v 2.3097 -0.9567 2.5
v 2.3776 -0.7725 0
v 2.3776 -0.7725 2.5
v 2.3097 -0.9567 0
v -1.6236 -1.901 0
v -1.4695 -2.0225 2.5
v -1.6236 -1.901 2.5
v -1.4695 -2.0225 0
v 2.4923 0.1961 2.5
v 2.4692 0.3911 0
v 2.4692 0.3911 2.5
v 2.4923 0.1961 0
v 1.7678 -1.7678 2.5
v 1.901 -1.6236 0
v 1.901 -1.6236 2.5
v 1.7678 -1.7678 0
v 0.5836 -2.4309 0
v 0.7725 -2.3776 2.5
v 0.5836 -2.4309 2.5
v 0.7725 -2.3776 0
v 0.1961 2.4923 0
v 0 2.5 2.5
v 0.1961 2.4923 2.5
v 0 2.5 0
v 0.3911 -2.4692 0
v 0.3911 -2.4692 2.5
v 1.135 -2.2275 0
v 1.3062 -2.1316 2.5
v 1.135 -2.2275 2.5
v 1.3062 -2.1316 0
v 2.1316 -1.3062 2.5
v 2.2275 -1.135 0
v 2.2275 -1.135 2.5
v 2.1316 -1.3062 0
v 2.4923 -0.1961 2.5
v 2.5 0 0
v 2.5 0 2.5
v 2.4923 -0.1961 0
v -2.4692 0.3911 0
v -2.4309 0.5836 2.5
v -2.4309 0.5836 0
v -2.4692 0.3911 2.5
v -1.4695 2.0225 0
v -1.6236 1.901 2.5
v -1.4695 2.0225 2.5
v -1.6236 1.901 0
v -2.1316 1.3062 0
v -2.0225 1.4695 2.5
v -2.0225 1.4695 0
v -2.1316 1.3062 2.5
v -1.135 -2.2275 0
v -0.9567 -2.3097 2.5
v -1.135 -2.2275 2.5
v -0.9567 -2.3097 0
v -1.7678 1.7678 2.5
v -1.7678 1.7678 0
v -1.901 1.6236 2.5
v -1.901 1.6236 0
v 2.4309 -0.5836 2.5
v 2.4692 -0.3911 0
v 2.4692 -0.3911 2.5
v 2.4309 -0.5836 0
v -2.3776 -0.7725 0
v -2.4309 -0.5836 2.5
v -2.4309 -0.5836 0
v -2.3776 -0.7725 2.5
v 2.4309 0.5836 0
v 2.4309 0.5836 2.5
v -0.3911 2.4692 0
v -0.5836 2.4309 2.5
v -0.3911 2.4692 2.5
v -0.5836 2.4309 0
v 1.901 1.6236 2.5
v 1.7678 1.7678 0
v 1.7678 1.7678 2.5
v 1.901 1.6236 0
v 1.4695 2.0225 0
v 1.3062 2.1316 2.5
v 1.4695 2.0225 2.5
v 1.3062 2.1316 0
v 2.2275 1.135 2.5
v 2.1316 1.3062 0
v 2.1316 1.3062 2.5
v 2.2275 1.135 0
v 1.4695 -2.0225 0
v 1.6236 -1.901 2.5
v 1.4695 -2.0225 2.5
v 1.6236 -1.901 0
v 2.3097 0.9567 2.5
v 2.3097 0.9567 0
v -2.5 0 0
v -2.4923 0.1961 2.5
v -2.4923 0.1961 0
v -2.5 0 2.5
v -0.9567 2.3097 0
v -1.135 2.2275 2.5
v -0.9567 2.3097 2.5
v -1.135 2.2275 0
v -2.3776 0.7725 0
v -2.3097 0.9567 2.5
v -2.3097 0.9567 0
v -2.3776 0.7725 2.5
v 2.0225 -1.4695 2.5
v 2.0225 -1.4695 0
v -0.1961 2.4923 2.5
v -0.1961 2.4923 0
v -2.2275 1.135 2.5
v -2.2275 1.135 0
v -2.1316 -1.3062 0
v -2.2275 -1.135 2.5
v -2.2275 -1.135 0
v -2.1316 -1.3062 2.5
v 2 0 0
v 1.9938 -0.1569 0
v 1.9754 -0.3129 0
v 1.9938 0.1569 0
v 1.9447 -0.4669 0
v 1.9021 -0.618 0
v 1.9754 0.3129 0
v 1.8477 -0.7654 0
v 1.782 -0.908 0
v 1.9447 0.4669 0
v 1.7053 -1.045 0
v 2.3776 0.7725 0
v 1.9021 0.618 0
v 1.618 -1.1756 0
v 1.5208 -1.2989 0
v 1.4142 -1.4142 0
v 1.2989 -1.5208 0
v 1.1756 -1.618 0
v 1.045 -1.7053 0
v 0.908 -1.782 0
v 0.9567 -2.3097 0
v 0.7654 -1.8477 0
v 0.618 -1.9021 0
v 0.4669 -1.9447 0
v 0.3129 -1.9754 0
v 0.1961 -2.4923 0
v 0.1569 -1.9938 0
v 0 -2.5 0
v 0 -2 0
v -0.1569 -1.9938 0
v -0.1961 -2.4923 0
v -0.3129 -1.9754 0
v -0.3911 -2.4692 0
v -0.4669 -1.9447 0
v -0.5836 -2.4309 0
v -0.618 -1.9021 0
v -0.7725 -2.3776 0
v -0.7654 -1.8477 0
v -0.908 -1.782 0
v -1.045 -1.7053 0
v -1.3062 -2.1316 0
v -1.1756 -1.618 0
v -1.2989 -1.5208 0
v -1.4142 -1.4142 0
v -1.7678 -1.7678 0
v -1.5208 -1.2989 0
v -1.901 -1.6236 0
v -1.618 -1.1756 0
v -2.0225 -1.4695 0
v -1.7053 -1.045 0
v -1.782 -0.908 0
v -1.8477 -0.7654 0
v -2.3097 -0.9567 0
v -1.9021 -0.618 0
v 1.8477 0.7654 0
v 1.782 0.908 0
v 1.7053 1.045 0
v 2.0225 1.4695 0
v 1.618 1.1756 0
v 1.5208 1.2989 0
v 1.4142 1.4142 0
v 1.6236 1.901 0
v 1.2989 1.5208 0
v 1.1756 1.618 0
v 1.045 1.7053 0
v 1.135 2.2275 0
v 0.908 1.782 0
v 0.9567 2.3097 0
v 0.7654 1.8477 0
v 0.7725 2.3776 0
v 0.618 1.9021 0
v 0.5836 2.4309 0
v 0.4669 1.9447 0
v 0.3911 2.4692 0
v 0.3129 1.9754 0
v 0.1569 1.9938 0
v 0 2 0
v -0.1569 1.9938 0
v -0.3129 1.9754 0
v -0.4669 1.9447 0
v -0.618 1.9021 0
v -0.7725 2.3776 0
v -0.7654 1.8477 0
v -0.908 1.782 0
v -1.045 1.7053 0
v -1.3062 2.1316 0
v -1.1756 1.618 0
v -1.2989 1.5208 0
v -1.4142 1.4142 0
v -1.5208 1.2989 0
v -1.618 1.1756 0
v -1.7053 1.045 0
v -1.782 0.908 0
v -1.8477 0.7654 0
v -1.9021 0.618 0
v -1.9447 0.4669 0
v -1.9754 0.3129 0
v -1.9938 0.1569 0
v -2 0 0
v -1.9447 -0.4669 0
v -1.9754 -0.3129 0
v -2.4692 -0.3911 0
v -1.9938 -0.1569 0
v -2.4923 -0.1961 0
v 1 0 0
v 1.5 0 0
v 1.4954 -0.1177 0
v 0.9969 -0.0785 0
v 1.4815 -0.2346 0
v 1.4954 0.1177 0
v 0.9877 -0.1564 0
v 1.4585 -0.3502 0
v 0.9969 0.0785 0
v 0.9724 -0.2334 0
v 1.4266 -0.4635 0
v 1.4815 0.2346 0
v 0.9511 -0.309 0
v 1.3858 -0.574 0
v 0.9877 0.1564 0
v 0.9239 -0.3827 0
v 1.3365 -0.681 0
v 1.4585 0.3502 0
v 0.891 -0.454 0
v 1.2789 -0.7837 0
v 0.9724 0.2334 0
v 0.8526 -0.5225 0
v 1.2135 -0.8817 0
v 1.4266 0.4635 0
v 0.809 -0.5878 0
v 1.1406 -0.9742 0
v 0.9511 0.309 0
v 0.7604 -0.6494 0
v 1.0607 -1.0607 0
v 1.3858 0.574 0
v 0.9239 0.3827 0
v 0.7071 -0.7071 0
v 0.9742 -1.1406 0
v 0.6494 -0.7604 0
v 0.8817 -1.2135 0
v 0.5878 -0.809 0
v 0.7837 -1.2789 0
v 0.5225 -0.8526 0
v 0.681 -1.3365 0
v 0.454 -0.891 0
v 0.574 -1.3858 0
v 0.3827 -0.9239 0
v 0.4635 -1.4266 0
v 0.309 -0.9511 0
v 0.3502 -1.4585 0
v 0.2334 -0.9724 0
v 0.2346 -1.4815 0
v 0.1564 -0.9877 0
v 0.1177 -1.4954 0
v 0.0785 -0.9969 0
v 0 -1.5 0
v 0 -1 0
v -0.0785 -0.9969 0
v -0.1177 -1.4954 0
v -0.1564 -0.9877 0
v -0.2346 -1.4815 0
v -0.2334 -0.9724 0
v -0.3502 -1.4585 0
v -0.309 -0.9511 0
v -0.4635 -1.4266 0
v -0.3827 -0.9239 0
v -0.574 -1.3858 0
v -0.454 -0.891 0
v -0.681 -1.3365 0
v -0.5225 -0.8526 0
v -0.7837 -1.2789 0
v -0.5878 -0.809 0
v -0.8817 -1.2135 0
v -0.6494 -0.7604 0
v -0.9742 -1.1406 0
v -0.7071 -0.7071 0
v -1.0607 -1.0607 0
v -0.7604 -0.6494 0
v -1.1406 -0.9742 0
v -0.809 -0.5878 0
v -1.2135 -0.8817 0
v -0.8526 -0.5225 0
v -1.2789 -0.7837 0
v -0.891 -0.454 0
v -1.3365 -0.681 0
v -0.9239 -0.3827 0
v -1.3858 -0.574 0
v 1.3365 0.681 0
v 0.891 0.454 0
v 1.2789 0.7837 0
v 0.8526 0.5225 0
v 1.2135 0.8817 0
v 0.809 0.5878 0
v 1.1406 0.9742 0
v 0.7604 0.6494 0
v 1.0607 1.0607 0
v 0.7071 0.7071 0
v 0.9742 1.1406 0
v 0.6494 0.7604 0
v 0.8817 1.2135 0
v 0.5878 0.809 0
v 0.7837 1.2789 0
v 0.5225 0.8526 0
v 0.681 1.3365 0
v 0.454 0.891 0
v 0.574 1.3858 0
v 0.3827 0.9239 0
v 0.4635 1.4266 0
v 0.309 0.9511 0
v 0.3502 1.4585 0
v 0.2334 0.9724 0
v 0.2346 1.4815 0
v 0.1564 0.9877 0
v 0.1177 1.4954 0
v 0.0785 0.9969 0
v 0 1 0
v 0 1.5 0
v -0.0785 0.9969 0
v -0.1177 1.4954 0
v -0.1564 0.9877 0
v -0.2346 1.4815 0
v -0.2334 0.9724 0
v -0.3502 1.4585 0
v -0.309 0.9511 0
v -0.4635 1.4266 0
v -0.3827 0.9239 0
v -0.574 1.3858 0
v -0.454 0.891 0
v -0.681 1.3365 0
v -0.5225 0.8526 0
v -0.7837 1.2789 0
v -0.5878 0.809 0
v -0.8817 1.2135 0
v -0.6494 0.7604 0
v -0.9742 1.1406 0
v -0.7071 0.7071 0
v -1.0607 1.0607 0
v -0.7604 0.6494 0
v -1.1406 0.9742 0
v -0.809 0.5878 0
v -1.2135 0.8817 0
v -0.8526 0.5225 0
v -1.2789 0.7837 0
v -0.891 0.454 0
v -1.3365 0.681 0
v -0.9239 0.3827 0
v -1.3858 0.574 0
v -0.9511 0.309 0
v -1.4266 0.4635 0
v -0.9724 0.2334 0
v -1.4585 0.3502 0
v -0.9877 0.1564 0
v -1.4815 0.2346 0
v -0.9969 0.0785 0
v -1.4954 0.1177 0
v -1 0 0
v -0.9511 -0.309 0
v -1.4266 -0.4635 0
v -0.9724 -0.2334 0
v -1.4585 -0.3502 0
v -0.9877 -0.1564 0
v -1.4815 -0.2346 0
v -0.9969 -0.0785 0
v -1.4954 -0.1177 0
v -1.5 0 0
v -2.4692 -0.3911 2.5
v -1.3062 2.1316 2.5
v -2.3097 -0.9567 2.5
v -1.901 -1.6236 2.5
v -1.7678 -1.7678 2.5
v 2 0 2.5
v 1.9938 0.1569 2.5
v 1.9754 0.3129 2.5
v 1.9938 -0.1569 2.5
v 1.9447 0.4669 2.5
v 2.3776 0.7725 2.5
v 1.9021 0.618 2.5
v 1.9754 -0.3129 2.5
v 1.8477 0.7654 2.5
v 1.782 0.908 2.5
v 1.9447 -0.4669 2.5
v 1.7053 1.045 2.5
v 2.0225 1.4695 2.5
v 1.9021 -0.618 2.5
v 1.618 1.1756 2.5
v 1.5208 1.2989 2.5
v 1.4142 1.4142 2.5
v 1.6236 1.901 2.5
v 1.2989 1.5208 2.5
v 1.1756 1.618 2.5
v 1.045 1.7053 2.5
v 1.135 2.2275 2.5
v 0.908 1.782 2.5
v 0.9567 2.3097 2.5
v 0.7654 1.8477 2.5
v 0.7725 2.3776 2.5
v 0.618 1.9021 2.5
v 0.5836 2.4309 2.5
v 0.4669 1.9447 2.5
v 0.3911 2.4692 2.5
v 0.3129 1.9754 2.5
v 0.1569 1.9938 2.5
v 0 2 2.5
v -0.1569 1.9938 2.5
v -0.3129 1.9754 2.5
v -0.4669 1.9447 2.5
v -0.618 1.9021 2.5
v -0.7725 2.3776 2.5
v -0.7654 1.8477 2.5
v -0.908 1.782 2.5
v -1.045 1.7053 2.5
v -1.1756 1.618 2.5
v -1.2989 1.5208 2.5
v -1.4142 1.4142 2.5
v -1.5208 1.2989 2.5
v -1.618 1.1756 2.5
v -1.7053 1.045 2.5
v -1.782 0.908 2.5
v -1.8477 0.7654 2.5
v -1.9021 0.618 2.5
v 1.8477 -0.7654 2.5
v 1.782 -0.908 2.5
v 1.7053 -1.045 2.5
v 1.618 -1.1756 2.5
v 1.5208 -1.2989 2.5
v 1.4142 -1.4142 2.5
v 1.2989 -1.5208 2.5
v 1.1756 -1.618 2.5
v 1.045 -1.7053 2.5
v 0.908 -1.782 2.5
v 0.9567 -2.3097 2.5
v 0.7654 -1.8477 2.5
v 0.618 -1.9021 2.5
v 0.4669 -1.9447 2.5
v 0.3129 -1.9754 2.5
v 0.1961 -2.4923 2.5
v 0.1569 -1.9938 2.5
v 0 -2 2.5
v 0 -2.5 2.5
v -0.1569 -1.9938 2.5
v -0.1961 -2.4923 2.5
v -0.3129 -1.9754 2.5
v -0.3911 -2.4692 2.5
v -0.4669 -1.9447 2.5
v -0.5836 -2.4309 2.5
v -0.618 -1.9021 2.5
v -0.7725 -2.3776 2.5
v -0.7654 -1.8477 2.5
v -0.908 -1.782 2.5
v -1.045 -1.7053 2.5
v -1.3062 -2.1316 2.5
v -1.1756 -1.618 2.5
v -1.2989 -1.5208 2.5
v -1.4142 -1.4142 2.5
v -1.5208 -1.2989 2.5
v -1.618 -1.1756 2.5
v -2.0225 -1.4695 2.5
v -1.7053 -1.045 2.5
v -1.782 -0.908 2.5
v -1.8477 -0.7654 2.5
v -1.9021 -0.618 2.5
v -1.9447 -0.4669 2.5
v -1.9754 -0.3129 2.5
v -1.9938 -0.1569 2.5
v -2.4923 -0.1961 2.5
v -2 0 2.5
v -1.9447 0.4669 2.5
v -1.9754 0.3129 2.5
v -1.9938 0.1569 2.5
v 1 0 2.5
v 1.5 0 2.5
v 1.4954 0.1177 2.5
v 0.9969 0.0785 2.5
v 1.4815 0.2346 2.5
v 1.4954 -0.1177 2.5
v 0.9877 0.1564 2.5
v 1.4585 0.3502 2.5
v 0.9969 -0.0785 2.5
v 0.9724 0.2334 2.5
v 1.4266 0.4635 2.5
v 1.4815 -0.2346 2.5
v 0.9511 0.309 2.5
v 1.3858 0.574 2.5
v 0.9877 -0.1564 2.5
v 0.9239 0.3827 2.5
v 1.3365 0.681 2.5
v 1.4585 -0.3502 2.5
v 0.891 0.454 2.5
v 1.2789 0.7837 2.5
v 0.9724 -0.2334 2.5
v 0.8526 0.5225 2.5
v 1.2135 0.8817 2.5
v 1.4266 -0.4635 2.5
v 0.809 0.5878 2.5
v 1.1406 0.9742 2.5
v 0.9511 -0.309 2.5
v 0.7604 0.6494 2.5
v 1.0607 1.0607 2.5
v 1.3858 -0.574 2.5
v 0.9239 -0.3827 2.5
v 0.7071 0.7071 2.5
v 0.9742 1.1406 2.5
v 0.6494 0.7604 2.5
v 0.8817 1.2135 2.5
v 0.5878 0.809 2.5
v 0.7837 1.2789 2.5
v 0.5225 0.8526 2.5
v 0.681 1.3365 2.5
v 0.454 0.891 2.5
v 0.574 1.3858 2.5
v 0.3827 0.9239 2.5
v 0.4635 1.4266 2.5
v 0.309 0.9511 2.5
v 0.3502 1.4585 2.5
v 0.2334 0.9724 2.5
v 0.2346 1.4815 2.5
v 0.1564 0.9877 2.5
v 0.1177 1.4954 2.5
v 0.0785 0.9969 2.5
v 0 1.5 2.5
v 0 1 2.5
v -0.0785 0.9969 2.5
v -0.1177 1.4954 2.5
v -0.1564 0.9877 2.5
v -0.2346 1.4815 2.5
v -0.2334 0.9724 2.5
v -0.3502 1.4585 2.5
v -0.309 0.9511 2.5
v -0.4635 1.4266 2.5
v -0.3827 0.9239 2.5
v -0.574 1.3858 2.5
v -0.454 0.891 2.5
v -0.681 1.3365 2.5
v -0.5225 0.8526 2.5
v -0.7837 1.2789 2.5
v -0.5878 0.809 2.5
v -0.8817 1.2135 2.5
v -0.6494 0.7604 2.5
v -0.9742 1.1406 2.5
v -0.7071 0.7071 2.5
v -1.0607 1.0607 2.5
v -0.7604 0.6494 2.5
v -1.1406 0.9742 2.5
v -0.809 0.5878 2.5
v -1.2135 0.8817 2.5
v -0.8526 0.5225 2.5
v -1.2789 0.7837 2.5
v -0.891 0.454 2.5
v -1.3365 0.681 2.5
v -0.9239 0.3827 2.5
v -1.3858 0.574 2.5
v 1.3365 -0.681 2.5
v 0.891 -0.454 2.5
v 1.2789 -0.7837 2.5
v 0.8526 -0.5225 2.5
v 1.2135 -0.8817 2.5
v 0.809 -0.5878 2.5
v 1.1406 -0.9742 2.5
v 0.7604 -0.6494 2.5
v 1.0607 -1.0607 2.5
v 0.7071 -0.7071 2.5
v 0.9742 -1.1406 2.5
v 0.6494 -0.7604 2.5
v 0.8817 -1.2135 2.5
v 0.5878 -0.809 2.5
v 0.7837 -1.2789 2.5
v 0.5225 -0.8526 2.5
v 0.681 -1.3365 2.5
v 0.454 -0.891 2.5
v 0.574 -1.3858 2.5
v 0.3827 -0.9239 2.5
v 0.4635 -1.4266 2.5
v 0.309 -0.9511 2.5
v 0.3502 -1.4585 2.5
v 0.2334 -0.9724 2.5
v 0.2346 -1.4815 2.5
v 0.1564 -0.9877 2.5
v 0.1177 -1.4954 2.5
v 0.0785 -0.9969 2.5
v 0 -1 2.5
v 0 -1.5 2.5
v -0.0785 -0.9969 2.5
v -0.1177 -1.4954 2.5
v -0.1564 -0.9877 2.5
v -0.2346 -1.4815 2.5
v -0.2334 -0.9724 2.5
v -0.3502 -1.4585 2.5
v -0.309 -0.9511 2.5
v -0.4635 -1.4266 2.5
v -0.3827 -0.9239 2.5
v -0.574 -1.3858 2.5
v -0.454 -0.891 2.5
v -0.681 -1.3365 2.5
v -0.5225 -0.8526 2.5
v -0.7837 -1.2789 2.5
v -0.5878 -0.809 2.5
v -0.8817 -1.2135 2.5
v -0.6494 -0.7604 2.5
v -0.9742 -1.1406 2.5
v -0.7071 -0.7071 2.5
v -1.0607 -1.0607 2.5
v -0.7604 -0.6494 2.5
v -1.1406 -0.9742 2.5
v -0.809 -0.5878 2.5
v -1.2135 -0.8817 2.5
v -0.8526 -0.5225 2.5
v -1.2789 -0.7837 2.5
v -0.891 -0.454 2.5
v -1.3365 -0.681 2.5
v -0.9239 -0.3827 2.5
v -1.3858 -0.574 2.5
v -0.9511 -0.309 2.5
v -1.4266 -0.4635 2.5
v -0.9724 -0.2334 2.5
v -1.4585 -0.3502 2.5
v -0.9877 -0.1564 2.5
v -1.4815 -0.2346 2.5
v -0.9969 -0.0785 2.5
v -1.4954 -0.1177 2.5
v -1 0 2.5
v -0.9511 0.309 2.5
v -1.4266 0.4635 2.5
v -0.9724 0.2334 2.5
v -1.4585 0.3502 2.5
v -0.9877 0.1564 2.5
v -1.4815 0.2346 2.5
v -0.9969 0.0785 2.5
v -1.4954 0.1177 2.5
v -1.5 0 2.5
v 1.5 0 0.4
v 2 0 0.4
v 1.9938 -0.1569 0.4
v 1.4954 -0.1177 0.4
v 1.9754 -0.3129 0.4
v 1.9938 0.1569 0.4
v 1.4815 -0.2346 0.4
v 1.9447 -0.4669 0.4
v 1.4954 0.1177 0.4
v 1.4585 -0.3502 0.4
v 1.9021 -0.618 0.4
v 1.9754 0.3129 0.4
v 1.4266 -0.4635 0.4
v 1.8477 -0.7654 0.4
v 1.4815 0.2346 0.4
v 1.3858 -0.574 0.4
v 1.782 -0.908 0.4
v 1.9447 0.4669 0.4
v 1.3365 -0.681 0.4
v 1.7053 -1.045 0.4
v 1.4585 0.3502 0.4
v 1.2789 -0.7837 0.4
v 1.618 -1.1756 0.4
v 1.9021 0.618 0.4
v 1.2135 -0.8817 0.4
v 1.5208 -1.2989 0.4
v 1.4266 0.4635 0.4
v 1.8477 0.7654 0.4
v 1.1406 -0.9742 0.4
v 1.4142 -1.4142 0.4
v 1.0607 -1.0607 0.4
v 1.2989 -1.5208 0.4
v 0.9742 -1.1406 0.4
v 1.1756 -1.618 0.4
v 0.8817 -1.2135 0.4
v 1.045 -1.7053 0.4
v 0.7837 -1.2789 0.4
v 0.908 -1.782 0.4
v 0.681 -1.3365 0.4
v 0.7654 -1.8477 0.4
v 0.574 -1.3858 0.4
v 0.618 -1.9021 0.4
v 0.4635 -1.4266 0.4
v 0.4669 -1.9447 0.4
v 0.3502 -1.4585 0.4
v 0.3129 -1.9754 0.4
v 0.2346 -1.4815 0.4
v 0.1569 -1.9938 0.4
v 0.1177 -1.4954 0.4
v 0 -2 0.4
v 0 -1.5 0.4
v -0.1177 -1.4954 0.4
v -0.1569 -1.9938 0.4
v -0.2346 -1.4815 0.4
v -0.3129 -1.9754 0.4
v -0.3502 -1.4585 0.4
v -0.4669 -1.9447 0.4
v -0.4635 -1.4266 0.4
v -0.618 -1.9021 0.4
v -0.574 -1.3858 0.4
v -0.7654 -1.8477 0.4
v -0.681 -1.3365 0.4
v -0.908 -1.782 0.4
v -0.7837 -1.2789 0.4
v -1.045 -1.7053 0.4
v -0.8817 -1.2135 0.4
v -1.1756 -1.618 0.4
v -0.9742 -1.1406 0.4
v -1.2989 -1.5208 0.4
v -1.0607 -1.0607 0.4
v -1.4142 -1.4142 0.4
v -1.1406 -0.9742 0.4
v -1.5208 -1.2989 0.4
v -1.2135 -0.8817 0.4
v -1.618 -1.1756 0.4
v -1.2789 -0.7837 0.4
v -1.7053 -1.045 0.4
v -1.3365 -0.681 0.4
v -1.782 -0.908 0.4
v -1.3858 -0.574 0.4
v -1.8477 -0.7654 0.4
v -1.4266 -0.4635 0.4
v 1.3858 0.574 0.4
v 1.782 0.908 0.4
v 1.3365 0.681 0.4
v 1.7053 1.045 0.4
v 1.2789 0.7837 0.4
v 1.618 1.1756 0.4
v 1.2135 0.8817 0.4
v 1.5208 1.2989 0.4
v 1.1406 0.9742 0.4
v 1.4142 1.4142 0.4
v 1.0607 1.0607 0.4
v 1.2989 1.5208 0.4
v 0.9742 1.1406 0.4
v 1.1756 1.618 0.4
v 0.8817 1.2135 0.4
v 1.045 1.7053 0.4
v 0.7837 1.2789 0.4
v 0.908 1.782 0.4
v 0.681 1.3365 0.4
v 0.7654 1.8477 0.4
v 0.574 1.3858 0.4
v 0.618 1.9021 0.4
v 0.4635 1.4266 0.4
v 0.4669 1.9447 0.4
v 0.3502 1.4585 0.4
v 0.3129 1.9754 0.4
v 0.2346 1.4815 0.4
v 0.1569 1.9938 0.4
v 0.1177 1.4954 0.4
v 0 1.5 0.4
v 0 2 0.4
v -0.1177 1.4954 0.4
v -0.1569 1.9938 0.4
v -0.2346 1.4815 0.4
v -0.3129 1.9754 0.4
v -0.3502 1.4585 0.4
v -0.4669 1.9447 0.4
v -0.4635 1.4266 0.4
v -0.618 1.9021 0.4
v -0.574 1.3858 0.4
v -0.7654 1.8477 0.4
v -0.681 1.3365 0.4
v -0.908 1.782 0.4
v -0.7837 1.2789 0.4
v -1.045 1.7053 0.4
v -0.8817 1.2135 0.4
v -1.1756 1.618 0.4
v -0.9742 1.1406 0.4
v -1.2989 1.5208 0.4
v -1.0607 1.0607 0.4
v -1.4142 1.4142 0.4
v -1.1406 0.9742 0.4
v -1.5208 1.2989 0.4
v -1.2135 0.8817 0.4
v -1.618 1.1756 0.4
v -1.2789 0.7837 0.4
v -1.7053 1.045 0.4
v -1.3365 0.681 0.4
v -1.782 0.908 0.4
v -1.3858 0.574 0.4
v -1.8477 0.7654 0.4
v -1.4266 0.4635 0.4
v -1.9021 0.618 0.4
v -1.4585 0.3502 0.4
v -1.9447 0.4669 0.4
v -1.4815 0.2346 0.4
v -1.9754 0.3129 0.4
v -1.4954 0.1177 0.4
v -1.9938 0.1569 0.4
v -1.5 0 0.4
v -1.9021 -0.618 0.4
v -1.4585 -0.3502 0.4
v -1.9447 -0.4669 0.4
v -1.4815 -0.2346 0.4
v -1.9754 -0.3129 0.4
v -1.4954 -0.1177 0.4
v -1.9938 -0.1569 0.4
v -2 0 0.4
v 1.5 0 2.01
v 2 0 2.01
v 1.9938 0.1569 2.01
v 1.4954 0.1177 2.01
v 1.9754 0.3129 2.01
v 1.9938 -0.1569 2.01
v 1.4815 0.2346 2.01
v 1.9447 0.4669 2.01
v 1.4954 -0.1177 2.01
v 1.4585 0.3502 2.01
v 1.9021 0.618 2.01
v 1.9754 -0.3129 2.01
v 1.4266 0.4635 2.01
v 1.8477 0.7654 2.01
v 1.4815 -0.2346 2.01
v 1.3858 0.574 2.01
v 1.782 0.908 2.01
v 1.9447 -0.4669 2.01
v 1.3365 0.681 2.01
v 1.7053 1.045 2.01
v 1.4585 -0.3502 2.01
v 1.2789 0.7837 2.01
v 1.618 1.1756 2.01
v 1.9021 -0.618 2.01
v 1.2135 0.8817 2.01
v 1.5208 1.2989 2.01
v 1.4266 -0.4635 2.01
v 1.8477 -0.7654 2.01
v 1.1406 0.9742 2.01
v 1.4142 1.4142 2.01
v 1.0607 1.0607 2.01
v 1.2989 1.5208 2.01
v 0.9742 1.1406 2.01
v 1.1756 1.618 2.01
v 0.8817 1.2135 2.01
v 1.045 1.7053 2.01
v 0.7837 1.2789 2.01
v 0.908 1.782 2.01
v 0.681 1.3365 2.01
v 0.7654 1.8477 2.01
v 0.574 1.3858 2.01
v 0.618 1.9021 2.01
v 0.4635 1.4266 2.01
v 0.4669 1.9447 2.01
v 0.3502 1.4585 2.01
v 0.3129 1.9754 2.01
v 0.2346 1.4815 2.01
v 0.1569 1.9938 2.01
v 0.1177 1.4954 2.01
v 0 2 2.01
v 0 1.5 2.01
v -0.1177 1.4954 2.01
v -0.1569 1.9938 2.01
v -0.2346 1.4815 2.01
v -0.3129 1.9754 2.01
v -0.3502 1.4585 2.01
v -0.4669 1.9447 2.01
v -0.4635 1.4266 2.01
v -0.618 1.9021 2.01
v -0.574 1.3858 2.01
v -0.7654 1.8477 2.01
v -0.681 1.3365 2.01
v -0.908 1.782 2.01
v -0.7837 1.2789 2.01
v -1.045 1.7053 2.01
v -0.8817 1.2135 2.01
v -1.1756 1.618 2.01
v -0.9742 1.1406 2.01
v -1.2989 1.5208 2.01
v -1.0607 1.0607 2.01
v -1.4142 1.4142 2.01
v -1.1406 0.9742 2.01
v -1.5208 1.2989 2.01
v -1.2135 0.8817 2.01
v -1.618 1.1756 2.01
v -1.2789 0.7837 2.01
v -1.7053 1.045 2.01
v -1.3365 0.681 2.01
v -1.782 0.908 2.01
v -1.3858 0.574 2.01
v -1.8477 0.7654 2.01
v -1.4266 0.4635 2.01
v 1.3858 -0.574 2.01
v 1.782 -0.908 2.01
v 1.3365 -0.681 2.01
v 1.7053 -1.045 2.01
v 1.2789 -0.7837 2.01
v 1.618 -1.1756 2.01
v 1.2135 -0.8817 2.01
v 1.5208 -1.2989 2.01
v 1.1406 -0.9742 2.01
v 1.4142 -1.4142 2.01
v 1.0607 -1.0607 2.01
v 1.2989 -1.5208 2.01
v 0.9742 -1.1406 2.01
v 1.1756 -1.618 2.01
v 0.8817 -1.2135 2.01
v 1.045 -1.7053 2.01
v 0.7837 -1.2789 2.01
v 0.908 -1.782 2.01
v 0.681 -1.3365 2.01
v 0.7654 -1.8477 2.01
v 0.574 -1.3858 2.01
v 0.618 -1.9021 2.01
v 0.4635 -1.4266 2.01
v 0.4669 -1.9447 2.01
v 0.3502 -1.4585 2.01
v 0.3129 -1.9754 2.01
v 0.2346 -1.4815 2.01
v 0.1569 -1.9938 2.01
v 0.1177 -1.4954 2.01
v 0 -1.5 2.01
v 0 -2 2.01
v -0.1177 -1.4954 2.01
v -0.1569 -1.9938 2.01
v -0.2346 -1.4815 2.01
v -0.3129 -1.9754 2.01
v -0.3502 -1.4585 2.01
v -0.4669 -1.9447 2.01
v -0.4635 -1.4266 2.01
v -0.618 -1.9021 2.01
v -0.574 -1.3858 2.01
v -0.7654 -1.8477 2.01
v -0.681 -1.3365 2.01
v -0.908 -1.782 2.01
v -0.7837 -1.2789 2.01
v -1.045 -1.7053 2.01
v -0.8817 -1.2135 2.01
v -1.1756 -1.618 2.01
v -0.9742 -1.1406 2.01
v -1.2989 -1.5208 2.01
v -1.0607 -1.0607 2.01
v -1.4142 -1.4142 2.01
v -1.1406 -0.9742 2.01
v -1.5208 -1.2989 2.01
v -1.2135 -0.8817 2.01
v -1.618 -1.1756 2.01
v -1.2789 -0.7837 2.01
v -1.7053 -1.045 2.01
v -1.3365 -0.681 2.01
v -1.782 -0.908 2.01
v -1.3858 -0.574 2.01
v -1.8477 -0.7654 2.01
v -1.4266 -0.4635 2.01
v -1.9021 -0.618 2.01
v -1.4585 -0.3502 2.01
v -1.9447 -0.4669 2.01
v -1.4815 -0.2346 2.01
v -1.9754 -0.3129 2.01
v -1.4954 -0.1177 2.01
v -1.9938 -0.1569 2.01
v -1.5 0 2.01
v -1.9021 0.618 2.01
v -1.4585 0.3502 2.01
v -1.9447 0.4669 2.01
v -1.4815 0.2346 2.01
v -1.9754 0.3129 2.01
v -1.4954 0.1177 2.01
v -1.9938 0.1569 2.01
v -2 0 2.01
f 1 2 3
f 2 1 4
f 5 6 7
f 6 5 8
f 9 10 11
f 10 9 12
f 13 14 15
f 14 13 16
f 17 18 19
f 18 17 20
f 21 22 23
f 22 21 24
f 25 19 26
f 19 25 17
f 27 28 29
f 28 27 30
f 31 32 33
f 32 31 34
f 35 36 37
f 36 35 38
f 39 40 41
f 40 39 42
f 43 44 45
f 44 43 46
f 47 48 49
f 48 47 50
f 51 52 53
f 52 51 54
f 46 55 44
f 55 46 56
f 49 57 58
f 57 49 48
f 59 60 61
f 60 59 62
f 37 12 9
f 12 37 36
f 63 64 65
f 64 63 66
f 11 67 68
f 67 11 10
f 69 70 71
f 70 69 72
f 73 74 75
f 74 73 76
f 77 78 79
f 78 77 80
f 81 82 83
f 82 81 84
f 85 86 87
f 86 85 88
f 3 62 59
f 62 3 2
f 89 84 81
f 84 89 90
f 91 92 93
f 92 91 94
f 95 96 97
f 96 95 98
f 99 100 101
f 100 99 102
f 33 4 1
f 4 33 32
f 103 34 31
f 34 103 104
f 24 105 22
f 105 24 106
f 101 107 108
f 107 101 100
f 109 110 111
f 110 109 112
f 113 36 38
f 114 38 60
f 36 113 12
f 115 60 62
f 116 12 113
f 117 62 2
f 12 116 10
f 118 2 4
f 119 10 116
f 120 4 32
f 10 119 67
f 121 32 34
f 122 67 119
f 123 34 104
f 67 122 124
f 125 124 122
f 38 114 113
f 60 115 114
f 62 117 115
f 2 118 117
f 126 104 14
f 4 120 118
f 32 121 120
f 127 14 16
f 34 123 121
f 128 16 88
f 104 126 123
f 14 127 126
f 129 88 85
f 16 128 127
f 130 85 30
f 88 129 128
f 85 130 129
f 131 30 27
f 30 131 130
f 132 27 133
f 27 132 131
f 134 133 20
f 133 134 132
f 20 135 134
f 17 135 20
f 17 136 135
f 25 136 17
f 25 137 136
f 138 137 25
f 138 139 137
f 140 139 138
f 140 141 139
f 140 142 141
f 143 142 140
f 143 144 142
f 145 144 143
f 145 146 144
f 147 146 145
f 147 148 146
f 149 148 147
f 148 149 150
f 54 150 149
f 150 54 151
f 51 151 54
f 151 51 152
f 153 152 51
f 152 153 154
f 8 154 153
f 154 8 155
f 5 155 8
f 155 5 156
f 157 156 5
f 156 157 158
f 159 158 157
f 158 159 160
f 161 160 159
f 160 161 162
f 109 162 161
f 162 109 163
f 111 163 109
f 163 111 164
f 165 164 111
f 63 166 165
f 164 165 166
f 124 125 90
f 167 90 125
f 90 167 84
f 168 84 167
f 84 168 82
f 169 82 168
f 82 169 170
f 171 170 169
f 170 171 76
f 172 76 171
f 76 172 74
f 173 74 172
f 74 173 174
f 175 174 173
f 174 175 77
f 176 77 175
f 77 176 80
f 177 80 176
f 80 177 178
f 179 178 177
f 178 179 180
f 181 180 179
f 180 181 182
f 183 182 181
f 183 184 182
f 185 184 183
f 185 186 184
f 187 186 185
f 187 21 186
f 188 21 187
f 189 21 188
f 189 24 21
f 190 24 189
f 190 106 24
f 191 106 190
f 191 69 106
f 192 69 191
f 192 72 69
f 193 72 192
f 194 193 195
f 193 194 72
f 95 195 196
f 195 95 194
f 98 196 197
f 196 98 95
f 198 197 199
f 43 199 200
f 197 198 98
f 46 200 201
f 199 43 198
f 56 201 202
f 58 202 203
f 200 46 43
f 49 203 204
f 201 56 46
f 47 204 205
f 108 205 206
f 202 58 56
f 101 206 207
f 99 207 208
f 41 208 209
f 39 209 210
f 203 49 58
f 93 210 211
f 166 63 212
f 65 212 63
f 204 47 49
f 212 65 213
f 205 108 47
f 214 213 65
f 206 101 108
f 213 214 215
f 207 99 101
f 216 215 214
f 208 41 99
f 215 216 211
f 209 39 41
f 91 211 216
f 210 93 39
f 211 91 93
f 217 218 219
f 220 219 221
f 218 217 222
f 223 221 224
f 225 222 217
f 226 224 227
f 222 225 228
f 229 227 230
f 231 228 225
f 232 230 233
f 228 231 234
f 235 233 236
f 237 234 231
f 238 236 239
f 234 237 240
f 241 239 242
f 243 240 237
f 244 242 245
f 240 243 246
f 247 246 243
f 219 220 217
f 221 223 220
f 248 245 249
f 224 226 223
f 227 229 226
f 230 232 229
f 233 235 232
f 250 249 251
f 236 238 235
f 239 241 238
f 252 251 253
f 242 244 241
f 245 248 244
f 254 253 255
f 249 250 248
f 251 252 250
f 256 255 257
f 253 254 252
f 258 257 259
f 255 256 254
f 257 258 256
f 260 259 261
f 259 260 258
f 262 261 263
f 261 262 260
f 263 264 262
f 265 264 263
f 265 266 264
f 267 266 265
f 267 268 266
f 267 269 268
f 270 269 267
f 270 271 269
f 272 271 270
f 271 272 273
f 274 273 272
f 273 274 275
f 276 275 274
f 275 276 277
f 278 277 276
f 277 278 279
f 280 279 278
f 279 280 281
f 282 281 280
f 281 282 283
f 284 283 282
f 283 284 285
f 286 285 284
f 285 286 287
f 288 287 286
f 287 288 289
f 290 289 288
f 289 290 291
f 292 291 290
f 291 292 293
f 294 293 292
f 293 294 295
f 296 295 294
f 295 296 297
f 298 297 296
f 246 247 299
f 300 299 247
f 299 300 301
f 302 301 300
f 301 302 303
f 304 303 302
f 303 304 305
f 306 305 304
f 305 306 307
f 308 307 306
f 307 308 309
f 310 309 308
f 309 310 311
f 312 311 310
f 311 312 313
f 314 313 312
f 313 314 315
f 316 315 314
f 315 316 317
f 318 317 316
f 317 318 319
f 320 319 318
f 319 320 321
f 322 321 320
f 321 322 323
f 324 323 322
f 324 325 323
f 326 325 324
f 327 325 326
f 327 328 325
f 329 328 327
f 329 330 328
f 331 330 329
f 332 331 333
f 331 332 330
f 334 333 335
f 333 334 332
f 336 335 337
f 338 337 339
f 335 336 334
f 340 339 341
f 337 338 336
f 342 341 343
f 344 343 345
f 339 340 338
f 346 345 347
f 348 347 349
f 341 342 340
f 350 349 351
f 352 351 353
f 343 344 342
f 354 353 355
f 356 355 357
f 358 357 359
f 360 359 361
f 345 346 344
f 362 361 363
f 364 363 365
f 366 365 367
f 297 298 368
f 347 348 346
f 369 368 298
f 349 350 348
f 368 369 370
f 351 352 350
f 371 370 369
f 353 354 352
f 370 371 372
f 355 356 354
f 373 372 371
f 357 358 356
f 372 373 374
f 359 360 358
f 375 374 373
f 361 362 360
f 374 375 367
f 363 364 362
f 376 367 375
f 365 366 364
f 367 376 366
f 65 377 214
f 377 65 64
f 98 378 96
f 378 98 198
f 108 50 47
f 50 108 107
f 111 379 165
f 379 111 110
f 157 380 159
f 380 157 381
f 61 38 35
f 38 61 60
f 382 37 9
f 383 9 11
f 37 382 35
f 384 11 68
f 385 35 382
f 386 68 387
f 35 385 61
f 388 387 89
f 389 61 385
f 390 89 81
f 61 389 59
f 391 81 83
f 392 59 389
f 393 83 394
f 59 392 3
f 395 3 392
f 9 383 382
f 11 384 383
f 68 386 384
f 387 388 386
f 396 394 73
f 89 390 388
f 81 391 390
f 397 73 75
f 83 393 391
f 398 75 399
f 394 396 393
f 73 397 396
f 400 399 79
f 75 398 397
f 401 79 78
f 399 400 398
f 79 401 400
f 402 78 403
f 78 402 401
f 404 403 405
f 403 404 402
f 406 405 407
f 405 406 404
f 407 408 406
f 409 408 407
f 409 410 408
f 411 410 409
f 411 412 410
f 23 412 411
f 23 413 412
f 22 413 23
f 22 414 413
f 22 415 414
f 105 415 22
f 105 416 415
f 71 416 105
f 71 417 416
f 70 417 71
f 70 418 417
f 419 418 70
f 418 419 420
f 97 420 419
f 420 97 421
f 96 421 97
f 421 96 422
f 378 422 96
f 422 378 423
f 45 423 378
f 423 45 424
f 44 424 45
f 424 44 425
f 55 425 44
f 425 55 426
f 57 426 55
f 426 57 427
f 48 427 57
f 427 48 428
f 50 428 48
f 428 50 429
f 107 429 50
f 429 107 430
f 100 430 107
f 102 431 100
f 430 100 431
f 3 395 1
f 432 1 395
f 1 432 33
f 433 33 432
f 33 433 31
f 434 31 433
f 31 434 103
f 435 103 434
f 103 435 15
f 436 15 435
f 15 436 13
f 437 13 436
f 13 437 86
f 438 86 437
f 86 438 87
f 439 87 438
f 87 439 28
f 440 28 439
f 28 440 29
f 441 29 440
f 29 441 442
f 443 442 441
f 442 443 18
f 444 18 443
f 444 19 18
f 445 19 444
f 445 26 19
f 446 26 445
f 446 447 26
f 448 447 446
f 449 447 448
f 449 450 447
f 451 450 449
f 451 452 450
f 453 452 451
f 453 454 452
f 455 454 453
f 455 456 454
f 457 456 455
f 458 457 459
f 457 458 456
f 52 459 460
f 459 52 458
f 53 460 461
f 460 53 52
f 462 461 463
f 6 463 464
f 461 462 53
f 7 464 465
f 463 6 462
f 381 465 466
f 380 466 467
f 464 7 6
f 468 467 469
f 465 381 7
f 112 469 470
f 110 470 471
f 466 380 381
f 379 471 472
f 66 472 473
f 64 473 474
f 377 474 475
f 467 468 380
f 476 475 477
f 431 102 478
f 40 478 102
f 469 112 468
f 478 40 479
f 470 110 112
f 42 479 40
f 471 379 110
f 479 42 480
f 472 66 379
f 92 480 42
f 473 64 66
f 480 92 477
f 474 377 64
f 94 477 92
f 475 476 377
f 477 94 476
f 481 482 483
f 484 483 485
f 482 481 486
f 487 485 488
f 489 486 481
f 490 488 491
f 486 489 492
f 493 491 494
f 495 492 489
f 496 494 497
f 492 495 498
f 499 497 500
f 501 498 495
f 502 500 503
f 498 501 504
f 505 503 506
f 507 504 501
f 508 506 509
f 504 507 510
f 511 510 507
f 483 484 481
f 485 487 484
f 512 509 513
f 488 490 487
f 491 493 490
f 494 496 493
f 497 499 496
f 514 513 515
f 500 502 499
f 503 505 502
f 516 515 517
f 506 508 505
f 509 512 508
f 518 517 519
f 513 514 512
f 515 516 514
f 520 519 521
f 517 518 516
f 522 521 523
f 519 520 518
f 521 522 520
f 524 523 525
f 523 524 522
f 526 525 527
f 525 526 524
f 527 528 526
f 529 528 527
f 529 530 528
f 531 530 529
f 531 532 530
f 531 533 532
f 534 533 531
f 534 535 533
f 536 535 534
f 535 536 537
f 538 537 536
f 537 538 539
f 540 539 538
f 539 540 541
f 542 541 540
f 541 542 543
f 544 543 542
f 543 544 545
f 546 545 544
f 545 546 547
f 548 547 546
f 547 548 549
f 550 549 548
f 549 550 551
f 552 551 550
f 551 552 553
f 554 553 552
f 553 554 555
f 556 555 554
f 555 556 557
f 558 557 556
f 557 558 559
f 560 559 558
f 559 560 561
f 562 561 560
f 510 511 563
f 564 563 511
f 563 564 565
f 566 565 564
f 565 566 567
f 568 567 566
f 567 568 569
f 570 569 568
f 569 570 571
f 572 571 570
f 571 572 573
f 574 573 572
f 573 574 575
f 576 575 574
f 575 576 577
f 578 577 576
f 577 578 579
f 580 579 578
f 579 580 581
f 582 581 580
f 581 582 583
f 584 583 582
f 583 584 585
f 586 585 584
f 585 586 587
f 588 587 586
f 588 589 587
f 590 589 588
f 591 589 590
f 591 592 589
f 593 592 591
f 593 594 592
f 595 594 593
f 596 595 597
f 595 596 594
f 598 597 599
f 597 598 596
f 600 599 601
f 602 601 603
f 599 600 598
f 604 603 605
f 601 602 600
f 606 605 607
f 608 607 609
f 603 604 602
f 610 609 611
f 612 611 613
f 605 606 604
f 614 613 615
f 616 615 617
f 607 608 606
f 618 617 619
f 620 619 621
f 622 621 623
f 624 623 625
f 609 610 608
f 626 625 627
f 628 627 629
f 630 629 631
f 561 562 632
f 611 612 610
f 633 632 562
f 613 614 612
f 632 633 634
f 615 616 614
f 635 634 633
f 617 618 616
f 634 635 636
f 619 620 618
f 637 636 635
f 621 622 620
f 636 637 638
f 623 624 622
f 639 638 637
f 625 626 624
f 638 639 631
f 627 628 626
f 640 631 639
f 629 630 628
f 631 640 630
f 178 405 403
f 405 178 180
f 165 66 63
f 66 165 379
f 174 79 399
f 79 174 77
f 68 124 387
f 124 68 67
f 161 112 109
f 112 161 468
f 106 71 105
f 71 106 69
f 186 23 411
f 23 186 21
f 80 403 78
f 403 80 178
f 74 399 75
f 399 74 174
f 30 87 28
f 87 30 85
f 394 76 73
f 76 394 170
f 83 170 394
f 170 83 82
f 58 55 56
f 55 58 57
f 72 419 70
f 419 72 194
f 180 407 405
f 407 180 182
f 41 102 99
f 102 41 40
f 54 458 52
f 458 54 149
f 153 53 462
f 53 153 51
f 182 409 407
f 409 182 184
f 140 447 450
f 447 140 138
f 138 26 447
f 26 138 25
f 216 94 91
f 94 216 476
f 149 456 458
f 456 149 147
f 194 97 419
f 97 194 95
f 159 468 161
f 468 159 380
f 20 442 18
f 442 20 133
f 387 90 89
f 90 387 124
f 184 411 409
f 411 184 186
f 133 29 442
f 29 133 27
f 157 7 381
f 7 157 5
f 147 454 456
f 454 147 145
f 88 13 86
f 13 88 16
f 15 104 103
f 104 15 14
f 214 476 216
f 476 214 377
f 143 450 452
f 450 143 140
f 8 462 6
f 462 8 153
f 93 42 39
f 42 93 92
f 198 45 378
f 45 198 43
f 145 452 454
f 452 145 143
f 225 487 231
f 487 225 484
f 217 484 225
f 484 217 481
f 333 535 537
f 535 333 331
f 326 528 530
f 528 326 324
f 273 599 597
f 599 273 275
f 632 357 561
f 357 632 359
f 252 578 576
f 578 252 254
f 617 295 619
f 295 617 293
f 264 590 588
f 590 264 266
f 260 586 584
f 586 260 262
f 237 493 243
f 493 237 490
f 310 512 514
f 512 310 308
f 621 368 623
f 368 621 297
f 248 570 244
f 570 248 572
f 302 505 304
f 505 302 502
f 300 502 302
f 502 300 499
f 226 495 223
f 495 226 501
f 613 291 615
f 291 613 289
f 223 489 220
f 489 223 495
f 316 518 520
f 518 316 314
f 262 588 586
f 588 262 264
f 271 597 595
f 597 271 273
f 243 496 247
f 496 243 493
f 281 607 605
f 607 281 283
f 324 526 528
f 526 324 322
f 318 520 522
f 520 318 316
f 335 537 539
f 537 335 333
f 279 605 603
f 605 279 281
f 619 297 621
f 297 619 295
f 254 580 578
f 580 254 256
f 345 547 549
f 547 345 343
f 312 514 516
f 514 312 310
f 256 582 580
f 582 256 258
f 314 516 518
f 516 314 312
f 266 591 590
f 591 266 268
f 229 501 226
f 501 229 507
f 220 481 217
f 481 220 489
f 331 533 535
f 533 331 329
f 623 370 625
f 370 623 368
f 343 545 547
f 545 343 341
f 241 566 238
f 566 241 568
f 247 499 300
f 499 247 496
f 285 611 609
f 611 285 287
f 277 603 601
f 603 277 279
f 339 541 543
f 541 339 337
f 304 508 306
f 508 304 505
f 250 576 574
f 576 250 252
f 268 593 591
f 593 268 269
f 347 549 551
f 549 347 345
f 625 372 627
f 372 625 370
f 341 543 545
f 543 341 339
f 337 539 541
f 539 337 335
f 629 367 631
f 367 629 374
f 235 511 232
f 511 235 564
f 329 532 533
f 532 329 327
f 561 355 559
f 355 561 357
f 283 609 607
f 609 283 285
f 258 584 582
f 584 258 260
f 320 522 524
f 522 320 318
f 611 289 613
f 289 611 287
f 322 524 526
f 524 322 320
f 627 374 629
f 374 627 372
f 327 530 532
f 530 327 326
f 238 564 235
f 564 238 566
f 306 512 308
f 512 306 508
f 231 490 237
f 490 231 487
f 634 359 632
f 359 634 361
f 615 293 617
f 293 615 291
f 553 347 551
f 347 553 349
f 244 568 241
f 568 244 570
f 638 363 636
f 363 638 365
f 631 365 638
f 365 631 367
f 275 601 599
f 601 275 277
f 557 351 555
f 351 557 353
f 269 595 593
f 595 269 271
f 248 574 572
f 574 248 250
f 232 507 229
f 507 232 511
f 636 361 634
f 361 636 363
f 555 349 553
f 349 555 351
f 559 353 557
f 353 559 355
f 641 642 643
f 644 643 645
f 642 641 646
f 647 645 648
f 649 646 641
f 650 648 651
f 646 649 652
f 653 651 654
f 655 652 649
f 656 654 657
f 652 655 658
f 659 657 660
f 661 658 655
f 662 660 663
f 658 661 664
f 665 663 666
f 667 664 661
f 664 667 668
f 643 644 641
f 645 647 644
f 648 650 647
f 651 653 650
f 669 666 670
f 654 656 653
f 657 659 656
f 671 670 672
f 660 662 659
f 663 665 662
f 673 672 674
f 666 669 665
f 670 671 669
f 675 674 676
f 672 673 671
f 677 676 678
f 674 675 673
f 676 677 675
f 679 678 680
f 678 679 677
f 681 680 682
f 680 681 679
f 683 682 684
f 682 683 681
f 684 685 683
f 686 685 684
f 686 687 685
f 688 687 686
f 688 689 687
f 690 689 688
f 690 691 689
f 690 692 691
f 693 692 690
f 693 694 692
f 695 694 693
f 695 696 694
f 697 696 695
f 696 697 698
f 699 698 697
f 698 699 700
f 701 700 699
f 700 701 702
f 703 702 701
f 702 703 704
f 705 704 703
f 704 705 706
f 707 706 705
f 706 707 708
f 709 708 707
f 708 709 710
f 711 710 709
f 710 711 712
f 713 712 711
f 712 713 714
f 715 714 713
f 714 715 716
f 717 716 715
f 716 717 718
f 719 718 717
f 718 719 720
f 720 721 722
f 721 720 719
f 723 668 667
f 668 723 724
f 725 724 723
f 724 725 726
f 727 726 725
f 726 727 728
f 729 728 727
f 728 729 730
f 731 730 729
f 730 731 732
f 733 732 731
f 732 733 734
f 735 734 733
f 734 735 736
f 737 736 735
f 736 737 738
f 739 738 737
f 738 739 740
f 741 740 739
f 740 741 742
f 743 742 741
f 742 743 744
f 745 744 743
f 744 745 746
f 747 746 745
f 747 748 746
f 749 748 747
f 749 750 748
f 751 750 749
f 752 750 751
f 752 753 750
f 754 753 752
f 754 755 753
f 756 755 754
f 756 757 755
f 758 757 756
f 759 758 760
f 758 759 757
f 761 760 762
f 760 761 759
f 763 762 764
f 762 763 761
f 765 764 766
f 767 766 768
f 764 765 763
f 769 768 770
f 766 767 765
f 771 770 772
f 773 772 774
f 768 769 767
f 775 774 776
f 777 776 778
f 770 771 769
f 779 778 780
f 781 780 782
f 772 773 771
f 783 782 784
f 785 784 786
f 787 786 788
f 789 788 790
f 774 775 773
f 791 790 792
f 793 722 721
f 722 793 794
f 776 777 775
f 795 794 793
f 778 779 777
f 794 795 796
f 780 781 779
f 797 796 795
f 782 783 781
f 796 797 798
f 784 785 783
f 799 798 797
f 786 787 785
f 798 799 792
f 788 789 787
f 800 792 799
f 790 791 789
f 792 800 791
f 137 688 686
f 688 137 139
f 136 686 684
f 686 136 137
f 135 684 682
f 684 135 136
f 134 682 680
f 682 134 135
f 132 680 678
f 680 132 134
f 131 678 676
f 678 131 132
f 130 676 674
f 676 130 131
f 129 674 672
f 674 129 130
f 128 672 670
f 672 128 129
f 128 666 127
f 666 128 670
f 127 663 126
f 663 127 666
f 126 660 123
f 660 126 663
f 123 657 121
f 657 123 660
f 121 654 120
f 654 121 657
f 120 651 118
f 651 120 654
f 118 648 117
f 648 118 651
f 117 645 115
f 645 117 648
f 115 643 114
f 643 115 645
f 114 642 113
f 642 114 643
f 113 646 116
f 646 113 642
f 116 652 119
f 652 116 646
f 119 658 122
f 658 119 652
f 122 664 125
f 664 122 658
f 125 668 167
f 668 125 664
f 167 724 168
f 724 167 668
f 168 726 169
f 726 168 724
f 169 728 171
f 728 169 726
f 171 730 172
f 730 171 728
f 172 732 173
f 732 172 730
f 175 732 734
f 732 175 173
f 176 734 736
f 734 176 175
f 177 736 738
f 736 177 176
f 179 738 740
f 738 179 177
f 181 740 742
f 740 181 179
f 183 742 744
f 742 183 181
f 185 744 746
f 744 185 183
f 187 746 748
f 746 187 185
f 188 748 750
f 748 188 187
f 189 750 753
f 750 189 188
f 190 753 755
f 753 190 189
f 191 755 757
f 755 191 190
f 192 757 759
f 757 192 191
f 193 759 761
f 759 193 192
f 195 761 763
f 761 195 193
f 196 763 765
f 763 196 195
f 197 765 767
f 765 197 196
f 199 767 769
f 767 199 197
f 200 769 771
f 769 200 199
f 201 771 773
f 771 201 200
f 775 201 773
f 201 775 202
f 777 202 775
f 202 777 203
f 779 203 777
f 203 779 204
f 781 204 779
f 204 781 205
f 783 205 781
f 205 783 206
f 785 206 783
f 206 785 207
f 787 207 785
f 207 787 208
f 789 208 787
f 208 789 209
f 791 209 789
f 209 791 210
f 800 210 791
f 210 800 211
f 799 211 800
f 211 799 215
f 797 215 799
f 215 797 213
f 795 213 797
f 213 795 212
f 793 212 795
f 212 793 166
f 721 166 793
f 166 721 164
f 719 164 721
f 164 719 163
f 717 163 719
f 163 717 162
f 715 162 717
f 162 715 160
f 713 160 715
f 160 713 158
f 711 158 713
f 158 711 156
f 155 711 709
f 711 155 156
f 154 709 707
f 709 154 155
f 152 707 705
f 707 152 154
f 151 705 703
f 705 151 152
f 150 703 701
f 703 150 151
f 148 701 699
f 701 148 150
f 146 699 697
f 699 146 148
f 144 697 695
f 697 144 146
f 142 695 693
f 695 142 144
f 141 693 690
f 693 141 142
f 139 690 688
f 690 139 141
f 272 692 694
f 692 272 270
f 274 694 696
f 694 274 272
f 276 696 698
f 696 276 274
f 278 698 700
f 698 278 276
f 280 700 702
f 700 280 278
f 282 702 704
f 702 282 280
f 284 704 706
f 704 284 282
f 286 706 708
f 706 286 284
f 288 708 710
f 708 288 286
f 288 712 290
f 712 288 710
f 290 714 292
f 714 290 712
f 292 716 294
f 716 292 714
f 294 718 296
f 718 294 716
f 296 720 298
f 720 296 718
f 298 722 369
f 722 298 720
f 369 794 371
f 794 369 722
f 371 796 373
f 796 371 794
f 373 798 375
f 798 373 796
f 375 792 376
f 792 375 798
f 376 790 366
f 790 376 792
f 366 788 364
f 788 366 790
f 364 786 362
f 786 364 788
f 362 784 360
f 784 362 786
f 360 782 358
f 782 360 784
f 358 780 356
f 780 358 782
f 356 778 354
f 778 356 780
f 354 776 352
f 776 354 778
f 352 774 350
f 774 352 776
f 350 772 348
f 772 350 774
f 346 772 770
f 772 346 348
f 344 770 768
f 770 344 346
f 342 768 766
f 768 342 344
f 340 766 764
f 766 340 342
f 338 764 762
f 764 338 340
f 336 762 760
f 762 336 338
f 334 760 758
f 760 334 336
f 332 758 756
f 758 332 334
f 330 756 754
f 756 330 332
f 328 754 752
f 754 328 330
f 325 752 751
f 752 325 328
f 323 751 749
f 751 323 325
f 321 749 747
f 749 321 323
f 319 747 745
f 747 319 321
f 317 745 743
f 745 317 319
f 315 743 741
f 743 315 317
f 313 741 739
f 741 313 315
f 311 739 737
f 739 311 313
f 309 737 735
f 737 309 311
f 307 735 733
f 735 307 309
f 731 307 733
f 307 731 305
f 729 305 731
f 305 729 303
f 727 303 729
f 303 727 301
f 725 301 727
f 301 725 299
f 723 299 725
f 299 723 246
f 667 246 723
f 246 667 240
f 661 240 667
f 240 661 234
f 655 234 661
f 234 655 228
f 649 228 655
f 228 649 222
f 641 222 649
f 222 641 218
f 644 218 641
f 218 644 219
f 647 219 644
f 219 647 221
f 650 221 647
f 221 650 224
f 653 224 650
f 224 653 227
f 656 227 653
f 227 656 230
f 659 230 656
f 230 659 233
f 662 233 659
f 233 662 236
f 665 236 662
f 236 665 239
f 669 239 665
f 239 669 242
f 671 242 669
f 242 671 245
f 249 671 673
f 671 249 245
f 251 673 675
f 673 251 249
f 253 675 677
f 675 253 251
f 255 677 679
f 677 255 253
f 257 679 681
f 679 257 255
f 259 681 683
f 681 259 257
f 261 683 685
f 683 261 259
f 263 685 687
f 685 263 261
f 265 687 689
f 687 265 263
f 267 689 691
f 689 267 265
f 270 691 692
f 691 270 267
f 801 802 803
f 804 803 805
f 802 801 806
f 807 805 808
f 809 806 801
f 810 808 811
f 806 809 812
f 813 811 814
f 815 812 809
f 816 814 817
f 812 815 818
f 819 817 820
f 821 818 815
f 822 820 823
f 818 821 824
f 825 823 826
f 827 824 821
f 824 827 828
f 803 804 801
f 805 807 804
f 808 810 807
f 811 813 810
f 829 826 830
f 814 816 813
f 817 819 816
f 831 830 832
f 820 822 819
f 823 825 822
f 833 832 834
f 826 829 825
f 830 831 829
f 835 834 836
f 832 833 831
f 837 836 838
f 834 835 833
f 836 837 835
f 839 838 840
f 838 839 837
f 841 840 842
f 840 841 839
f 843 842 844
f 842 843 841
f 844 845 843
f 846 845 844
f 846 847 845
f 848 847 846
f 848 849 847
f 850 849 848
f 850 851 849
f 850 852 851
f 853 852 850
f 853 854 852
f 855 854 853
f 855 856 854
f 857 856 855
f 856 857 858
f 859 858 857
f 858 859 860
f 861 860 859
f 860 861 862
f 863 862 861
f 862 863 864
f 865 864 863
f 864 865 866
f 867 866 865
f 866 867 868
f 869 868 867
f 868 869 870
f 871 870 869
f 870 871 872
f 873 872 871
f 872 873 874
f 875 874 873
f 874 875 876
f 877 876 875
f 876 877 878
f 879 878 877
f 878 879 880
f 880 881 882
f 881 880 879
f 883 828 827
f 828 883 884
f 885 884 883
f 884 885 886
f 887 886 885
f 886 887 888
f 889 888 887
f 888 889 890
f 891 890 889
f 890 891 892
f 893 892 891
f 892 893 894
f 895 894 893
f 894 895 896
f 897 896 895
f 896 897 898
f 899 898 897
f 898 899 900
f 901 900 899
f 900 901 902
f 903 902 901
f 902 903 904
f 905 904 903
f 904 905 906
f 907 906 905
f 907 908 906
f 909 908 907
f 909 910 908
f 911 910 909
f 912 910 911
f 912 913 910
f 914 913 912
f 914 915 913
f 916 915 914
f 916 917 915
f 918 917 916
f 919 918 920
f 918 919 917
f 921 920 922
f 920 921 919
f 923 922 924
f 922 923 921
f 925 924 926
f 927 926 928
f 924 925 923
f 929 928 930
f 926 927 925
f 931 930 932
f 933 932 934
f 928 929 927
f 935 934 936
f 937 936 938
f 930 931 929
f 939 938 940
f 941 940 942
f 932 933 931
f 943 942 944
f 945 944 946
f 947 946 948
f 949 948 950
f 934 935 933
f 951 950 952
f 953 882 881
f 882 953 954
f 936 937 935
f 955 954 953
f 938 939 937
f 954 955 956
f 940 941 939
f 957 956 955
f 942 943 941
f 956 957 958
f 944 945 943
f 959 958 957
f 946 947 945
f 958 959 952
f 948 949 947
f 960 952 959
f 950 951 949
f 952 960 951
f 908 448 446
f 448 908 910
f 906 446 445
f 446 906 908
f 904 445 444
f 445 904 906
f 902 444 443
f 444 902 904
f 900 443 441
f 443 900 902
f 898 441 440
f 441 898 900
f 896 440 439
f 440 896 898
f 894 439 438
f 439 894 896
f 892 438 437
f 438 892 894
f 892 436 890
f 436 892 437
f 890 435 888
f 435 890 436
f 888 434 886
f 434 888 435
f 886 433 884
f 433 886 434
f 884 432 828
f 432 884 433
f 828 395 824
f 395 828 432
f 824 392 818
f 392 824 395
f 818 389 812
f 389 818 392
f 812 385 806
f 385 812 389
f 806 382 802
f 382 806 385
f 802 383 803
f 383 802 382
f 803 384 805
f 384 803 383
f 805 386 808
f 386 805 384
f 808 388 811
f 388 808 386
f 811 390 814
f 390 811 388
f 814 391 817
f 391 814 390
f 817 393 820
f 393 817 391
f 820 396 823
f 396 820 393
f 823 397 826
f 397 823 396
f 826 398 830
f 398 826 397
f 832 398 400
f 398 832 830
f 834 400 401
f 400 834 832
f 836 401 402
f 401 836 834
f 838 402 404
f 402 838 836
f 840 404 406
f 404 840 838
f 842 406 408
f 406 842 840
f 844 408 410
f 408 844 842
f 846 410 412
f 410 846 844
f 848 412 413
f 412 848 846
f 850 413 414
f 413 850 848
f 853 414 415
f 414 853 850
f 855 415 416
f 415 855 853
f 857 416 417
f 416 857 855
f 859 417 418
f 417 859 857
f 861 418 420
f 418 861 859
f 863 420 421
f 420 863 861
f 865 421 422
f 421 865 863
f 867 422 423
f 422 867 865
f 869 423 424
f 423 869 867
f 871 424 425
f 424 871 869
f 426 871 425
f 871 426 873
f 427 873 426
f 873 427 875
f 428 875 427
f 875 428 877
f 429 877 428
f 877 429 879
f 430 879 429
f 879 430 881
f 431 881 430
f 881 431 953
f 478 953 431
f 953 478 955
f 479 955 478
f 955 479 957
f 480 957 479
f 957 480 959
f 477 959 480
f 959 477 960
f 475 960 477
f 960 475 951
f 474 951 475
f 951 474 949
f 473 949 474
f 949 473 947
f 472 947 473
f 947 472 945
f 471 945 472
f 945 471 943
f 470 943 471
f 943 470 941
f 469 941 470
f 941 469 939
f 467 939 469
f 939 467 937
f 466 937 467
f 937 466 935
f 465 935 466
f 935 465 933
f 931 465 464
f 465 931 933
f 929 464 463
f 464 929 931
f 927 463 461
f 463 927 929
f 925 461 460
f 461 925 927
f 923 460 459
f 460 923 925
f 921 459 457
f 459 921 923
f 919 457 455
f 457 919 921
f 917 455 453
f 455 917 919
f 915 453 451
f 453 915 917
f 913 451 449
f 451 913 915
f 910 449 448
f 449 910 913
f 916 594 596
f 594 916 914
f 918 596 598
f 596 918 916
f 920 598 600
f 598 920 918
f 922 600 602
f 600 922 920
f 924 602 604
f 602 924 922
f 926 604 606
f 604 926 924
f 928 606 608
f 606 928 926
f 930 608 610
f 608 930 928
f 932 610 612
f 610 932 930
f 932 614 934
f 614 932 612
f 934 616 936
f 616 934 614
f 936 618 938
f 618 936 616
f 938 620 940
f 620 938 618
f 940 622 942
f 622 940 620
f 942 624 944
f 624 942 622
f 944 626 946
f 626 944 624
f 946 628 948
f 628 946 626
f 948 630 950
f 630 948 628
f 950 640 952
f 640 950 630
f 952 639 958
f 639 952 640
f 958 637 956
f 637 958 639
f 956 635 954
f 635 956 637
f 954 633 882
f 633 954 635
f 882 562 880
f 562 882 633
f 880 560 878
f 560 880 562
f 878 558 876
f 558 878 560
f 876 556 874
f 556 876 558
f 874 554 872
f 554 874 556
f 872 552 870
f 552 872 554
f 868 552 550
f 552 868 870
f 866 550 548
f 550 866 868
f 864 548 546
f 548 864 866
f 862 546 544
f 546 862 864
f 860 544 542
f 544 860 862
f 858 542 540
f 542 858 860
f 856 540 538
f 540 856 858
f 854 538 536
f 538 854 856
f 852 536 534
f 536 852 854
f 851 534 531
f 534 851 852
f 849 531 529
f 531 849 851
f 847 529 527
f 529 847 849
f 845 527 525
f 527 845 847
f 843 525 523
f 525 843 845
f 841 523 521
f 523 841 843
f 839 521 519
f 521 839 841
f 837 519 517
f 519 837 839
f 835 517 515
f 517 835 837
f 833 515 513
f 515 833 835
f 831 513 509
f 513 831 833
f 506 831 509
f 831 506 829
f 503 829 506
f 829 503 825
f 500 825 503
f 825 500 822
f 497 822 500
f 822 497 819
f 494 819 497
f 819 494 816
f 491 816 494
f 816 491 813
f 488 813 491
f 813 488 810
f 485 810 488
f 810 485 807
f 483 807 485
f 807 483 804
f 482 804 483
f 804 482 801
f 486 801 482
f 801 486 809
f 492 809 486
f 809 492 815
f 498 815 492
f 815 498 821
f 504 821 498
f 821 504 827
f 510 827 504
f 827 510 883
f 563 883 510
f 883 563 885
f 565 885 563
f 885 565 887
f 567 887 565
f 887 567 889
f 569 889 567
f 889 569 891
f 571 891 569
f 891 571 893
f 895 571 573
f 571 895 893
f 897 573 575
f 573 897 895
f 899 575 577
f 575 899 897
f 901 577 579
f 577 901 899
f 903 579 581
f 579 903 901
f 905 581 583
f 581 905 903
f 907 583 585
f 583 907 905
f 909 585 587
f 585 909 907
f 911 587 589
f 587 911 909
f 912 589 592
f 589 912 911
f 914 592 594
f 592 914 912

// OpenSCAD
// file: ../Common/arc.scad
radius = 5;
thickness = 1;
angle = 130;

/*
radius: Outside radius of the arc
thickness: Thickness between the inside and outside of the radius
angle: The angle of the arc, anywhere between 0 and 360.
*/
module arc(radius, thickness, angle)
{
    intersection()
    {
        union()
        {
            rights = floor(angle / 90);
            remain = angle - rights * 90;
            if (angle > 90)
            {
                for (i = [0:rights - 1])
                {
                    rotate(i * 90 - (rights - 1) * 90 / 2)
                    {
                        polygon([
                            [ 0, 0 ], [ radius + thickness, (radius + thickness) * tan(90 / 2) ],
                            [ radius + thickness, -(radius + thickness) * tan(90 / 2) ]
                        ]);
                    }
                }
                rotate(-(rights) * 90 / 2) polygon([
                    [ 0, 0 ], [ radius + thickness, 0 ], [ radius + thickness, -(radius + thickness) * tan(remain / 2) ]
                ]);
                rotate((rights) * 90 / 2) polygon([
                    [ 0, 0 ], [ radius + thickness, (radius + thickness) * tan(remain / 2) ], [ radius + thickness, 0 ]
                ]);
            }
            else
            {
                polygon([
                    [ 0, 0 ], [ radius + thickness, (radius + thickness) * tan(angle / 2) ],
                    [ radius + thickness, -(radius + thickness) * tan(angle / 2) ]
                ]);
            }
        }
        difference()
        {
            circle(radius + thickness);
            circle(radius);
        }
    }
}

arc(radius = radius, thickness = thickness, angle = angle);
// main file
use <../Common/arc.scad>

bearing_inner_diameter = 2; // 0.1
bearing_outer_diameter = 5; // 0.1
bearing_thickness = 2.5; // 0.1
/* [Hidden] */
$fn = 80;

difference()
{
    
    color("green")
    cylinder(h = bearing_thickness, d = bearing_outer_diameter);
    translate([0,0,-0.1]) cylinder(h = bearing_thickness + 0.2, d = bearing_inner_diameter);
    
    arc_thickness = (bearing_outer_diameter - bearing_inner_diameter) / 2 - 1;
    
    translate([0,0,-0.1])
     linear_extrude(0.5) 
      arc(radius = bearing_inner_diameter / 2 + 0.5, thickness = arc_thickness, angle = 360);
    
    translate([0,0,bearing_thickness - 0.49])
     linear_extrude(0.5) 
      arc(radius = bearing_inner_diameter / 2 + 0.5, thickness = arc_thickness, angle = 360);
}
